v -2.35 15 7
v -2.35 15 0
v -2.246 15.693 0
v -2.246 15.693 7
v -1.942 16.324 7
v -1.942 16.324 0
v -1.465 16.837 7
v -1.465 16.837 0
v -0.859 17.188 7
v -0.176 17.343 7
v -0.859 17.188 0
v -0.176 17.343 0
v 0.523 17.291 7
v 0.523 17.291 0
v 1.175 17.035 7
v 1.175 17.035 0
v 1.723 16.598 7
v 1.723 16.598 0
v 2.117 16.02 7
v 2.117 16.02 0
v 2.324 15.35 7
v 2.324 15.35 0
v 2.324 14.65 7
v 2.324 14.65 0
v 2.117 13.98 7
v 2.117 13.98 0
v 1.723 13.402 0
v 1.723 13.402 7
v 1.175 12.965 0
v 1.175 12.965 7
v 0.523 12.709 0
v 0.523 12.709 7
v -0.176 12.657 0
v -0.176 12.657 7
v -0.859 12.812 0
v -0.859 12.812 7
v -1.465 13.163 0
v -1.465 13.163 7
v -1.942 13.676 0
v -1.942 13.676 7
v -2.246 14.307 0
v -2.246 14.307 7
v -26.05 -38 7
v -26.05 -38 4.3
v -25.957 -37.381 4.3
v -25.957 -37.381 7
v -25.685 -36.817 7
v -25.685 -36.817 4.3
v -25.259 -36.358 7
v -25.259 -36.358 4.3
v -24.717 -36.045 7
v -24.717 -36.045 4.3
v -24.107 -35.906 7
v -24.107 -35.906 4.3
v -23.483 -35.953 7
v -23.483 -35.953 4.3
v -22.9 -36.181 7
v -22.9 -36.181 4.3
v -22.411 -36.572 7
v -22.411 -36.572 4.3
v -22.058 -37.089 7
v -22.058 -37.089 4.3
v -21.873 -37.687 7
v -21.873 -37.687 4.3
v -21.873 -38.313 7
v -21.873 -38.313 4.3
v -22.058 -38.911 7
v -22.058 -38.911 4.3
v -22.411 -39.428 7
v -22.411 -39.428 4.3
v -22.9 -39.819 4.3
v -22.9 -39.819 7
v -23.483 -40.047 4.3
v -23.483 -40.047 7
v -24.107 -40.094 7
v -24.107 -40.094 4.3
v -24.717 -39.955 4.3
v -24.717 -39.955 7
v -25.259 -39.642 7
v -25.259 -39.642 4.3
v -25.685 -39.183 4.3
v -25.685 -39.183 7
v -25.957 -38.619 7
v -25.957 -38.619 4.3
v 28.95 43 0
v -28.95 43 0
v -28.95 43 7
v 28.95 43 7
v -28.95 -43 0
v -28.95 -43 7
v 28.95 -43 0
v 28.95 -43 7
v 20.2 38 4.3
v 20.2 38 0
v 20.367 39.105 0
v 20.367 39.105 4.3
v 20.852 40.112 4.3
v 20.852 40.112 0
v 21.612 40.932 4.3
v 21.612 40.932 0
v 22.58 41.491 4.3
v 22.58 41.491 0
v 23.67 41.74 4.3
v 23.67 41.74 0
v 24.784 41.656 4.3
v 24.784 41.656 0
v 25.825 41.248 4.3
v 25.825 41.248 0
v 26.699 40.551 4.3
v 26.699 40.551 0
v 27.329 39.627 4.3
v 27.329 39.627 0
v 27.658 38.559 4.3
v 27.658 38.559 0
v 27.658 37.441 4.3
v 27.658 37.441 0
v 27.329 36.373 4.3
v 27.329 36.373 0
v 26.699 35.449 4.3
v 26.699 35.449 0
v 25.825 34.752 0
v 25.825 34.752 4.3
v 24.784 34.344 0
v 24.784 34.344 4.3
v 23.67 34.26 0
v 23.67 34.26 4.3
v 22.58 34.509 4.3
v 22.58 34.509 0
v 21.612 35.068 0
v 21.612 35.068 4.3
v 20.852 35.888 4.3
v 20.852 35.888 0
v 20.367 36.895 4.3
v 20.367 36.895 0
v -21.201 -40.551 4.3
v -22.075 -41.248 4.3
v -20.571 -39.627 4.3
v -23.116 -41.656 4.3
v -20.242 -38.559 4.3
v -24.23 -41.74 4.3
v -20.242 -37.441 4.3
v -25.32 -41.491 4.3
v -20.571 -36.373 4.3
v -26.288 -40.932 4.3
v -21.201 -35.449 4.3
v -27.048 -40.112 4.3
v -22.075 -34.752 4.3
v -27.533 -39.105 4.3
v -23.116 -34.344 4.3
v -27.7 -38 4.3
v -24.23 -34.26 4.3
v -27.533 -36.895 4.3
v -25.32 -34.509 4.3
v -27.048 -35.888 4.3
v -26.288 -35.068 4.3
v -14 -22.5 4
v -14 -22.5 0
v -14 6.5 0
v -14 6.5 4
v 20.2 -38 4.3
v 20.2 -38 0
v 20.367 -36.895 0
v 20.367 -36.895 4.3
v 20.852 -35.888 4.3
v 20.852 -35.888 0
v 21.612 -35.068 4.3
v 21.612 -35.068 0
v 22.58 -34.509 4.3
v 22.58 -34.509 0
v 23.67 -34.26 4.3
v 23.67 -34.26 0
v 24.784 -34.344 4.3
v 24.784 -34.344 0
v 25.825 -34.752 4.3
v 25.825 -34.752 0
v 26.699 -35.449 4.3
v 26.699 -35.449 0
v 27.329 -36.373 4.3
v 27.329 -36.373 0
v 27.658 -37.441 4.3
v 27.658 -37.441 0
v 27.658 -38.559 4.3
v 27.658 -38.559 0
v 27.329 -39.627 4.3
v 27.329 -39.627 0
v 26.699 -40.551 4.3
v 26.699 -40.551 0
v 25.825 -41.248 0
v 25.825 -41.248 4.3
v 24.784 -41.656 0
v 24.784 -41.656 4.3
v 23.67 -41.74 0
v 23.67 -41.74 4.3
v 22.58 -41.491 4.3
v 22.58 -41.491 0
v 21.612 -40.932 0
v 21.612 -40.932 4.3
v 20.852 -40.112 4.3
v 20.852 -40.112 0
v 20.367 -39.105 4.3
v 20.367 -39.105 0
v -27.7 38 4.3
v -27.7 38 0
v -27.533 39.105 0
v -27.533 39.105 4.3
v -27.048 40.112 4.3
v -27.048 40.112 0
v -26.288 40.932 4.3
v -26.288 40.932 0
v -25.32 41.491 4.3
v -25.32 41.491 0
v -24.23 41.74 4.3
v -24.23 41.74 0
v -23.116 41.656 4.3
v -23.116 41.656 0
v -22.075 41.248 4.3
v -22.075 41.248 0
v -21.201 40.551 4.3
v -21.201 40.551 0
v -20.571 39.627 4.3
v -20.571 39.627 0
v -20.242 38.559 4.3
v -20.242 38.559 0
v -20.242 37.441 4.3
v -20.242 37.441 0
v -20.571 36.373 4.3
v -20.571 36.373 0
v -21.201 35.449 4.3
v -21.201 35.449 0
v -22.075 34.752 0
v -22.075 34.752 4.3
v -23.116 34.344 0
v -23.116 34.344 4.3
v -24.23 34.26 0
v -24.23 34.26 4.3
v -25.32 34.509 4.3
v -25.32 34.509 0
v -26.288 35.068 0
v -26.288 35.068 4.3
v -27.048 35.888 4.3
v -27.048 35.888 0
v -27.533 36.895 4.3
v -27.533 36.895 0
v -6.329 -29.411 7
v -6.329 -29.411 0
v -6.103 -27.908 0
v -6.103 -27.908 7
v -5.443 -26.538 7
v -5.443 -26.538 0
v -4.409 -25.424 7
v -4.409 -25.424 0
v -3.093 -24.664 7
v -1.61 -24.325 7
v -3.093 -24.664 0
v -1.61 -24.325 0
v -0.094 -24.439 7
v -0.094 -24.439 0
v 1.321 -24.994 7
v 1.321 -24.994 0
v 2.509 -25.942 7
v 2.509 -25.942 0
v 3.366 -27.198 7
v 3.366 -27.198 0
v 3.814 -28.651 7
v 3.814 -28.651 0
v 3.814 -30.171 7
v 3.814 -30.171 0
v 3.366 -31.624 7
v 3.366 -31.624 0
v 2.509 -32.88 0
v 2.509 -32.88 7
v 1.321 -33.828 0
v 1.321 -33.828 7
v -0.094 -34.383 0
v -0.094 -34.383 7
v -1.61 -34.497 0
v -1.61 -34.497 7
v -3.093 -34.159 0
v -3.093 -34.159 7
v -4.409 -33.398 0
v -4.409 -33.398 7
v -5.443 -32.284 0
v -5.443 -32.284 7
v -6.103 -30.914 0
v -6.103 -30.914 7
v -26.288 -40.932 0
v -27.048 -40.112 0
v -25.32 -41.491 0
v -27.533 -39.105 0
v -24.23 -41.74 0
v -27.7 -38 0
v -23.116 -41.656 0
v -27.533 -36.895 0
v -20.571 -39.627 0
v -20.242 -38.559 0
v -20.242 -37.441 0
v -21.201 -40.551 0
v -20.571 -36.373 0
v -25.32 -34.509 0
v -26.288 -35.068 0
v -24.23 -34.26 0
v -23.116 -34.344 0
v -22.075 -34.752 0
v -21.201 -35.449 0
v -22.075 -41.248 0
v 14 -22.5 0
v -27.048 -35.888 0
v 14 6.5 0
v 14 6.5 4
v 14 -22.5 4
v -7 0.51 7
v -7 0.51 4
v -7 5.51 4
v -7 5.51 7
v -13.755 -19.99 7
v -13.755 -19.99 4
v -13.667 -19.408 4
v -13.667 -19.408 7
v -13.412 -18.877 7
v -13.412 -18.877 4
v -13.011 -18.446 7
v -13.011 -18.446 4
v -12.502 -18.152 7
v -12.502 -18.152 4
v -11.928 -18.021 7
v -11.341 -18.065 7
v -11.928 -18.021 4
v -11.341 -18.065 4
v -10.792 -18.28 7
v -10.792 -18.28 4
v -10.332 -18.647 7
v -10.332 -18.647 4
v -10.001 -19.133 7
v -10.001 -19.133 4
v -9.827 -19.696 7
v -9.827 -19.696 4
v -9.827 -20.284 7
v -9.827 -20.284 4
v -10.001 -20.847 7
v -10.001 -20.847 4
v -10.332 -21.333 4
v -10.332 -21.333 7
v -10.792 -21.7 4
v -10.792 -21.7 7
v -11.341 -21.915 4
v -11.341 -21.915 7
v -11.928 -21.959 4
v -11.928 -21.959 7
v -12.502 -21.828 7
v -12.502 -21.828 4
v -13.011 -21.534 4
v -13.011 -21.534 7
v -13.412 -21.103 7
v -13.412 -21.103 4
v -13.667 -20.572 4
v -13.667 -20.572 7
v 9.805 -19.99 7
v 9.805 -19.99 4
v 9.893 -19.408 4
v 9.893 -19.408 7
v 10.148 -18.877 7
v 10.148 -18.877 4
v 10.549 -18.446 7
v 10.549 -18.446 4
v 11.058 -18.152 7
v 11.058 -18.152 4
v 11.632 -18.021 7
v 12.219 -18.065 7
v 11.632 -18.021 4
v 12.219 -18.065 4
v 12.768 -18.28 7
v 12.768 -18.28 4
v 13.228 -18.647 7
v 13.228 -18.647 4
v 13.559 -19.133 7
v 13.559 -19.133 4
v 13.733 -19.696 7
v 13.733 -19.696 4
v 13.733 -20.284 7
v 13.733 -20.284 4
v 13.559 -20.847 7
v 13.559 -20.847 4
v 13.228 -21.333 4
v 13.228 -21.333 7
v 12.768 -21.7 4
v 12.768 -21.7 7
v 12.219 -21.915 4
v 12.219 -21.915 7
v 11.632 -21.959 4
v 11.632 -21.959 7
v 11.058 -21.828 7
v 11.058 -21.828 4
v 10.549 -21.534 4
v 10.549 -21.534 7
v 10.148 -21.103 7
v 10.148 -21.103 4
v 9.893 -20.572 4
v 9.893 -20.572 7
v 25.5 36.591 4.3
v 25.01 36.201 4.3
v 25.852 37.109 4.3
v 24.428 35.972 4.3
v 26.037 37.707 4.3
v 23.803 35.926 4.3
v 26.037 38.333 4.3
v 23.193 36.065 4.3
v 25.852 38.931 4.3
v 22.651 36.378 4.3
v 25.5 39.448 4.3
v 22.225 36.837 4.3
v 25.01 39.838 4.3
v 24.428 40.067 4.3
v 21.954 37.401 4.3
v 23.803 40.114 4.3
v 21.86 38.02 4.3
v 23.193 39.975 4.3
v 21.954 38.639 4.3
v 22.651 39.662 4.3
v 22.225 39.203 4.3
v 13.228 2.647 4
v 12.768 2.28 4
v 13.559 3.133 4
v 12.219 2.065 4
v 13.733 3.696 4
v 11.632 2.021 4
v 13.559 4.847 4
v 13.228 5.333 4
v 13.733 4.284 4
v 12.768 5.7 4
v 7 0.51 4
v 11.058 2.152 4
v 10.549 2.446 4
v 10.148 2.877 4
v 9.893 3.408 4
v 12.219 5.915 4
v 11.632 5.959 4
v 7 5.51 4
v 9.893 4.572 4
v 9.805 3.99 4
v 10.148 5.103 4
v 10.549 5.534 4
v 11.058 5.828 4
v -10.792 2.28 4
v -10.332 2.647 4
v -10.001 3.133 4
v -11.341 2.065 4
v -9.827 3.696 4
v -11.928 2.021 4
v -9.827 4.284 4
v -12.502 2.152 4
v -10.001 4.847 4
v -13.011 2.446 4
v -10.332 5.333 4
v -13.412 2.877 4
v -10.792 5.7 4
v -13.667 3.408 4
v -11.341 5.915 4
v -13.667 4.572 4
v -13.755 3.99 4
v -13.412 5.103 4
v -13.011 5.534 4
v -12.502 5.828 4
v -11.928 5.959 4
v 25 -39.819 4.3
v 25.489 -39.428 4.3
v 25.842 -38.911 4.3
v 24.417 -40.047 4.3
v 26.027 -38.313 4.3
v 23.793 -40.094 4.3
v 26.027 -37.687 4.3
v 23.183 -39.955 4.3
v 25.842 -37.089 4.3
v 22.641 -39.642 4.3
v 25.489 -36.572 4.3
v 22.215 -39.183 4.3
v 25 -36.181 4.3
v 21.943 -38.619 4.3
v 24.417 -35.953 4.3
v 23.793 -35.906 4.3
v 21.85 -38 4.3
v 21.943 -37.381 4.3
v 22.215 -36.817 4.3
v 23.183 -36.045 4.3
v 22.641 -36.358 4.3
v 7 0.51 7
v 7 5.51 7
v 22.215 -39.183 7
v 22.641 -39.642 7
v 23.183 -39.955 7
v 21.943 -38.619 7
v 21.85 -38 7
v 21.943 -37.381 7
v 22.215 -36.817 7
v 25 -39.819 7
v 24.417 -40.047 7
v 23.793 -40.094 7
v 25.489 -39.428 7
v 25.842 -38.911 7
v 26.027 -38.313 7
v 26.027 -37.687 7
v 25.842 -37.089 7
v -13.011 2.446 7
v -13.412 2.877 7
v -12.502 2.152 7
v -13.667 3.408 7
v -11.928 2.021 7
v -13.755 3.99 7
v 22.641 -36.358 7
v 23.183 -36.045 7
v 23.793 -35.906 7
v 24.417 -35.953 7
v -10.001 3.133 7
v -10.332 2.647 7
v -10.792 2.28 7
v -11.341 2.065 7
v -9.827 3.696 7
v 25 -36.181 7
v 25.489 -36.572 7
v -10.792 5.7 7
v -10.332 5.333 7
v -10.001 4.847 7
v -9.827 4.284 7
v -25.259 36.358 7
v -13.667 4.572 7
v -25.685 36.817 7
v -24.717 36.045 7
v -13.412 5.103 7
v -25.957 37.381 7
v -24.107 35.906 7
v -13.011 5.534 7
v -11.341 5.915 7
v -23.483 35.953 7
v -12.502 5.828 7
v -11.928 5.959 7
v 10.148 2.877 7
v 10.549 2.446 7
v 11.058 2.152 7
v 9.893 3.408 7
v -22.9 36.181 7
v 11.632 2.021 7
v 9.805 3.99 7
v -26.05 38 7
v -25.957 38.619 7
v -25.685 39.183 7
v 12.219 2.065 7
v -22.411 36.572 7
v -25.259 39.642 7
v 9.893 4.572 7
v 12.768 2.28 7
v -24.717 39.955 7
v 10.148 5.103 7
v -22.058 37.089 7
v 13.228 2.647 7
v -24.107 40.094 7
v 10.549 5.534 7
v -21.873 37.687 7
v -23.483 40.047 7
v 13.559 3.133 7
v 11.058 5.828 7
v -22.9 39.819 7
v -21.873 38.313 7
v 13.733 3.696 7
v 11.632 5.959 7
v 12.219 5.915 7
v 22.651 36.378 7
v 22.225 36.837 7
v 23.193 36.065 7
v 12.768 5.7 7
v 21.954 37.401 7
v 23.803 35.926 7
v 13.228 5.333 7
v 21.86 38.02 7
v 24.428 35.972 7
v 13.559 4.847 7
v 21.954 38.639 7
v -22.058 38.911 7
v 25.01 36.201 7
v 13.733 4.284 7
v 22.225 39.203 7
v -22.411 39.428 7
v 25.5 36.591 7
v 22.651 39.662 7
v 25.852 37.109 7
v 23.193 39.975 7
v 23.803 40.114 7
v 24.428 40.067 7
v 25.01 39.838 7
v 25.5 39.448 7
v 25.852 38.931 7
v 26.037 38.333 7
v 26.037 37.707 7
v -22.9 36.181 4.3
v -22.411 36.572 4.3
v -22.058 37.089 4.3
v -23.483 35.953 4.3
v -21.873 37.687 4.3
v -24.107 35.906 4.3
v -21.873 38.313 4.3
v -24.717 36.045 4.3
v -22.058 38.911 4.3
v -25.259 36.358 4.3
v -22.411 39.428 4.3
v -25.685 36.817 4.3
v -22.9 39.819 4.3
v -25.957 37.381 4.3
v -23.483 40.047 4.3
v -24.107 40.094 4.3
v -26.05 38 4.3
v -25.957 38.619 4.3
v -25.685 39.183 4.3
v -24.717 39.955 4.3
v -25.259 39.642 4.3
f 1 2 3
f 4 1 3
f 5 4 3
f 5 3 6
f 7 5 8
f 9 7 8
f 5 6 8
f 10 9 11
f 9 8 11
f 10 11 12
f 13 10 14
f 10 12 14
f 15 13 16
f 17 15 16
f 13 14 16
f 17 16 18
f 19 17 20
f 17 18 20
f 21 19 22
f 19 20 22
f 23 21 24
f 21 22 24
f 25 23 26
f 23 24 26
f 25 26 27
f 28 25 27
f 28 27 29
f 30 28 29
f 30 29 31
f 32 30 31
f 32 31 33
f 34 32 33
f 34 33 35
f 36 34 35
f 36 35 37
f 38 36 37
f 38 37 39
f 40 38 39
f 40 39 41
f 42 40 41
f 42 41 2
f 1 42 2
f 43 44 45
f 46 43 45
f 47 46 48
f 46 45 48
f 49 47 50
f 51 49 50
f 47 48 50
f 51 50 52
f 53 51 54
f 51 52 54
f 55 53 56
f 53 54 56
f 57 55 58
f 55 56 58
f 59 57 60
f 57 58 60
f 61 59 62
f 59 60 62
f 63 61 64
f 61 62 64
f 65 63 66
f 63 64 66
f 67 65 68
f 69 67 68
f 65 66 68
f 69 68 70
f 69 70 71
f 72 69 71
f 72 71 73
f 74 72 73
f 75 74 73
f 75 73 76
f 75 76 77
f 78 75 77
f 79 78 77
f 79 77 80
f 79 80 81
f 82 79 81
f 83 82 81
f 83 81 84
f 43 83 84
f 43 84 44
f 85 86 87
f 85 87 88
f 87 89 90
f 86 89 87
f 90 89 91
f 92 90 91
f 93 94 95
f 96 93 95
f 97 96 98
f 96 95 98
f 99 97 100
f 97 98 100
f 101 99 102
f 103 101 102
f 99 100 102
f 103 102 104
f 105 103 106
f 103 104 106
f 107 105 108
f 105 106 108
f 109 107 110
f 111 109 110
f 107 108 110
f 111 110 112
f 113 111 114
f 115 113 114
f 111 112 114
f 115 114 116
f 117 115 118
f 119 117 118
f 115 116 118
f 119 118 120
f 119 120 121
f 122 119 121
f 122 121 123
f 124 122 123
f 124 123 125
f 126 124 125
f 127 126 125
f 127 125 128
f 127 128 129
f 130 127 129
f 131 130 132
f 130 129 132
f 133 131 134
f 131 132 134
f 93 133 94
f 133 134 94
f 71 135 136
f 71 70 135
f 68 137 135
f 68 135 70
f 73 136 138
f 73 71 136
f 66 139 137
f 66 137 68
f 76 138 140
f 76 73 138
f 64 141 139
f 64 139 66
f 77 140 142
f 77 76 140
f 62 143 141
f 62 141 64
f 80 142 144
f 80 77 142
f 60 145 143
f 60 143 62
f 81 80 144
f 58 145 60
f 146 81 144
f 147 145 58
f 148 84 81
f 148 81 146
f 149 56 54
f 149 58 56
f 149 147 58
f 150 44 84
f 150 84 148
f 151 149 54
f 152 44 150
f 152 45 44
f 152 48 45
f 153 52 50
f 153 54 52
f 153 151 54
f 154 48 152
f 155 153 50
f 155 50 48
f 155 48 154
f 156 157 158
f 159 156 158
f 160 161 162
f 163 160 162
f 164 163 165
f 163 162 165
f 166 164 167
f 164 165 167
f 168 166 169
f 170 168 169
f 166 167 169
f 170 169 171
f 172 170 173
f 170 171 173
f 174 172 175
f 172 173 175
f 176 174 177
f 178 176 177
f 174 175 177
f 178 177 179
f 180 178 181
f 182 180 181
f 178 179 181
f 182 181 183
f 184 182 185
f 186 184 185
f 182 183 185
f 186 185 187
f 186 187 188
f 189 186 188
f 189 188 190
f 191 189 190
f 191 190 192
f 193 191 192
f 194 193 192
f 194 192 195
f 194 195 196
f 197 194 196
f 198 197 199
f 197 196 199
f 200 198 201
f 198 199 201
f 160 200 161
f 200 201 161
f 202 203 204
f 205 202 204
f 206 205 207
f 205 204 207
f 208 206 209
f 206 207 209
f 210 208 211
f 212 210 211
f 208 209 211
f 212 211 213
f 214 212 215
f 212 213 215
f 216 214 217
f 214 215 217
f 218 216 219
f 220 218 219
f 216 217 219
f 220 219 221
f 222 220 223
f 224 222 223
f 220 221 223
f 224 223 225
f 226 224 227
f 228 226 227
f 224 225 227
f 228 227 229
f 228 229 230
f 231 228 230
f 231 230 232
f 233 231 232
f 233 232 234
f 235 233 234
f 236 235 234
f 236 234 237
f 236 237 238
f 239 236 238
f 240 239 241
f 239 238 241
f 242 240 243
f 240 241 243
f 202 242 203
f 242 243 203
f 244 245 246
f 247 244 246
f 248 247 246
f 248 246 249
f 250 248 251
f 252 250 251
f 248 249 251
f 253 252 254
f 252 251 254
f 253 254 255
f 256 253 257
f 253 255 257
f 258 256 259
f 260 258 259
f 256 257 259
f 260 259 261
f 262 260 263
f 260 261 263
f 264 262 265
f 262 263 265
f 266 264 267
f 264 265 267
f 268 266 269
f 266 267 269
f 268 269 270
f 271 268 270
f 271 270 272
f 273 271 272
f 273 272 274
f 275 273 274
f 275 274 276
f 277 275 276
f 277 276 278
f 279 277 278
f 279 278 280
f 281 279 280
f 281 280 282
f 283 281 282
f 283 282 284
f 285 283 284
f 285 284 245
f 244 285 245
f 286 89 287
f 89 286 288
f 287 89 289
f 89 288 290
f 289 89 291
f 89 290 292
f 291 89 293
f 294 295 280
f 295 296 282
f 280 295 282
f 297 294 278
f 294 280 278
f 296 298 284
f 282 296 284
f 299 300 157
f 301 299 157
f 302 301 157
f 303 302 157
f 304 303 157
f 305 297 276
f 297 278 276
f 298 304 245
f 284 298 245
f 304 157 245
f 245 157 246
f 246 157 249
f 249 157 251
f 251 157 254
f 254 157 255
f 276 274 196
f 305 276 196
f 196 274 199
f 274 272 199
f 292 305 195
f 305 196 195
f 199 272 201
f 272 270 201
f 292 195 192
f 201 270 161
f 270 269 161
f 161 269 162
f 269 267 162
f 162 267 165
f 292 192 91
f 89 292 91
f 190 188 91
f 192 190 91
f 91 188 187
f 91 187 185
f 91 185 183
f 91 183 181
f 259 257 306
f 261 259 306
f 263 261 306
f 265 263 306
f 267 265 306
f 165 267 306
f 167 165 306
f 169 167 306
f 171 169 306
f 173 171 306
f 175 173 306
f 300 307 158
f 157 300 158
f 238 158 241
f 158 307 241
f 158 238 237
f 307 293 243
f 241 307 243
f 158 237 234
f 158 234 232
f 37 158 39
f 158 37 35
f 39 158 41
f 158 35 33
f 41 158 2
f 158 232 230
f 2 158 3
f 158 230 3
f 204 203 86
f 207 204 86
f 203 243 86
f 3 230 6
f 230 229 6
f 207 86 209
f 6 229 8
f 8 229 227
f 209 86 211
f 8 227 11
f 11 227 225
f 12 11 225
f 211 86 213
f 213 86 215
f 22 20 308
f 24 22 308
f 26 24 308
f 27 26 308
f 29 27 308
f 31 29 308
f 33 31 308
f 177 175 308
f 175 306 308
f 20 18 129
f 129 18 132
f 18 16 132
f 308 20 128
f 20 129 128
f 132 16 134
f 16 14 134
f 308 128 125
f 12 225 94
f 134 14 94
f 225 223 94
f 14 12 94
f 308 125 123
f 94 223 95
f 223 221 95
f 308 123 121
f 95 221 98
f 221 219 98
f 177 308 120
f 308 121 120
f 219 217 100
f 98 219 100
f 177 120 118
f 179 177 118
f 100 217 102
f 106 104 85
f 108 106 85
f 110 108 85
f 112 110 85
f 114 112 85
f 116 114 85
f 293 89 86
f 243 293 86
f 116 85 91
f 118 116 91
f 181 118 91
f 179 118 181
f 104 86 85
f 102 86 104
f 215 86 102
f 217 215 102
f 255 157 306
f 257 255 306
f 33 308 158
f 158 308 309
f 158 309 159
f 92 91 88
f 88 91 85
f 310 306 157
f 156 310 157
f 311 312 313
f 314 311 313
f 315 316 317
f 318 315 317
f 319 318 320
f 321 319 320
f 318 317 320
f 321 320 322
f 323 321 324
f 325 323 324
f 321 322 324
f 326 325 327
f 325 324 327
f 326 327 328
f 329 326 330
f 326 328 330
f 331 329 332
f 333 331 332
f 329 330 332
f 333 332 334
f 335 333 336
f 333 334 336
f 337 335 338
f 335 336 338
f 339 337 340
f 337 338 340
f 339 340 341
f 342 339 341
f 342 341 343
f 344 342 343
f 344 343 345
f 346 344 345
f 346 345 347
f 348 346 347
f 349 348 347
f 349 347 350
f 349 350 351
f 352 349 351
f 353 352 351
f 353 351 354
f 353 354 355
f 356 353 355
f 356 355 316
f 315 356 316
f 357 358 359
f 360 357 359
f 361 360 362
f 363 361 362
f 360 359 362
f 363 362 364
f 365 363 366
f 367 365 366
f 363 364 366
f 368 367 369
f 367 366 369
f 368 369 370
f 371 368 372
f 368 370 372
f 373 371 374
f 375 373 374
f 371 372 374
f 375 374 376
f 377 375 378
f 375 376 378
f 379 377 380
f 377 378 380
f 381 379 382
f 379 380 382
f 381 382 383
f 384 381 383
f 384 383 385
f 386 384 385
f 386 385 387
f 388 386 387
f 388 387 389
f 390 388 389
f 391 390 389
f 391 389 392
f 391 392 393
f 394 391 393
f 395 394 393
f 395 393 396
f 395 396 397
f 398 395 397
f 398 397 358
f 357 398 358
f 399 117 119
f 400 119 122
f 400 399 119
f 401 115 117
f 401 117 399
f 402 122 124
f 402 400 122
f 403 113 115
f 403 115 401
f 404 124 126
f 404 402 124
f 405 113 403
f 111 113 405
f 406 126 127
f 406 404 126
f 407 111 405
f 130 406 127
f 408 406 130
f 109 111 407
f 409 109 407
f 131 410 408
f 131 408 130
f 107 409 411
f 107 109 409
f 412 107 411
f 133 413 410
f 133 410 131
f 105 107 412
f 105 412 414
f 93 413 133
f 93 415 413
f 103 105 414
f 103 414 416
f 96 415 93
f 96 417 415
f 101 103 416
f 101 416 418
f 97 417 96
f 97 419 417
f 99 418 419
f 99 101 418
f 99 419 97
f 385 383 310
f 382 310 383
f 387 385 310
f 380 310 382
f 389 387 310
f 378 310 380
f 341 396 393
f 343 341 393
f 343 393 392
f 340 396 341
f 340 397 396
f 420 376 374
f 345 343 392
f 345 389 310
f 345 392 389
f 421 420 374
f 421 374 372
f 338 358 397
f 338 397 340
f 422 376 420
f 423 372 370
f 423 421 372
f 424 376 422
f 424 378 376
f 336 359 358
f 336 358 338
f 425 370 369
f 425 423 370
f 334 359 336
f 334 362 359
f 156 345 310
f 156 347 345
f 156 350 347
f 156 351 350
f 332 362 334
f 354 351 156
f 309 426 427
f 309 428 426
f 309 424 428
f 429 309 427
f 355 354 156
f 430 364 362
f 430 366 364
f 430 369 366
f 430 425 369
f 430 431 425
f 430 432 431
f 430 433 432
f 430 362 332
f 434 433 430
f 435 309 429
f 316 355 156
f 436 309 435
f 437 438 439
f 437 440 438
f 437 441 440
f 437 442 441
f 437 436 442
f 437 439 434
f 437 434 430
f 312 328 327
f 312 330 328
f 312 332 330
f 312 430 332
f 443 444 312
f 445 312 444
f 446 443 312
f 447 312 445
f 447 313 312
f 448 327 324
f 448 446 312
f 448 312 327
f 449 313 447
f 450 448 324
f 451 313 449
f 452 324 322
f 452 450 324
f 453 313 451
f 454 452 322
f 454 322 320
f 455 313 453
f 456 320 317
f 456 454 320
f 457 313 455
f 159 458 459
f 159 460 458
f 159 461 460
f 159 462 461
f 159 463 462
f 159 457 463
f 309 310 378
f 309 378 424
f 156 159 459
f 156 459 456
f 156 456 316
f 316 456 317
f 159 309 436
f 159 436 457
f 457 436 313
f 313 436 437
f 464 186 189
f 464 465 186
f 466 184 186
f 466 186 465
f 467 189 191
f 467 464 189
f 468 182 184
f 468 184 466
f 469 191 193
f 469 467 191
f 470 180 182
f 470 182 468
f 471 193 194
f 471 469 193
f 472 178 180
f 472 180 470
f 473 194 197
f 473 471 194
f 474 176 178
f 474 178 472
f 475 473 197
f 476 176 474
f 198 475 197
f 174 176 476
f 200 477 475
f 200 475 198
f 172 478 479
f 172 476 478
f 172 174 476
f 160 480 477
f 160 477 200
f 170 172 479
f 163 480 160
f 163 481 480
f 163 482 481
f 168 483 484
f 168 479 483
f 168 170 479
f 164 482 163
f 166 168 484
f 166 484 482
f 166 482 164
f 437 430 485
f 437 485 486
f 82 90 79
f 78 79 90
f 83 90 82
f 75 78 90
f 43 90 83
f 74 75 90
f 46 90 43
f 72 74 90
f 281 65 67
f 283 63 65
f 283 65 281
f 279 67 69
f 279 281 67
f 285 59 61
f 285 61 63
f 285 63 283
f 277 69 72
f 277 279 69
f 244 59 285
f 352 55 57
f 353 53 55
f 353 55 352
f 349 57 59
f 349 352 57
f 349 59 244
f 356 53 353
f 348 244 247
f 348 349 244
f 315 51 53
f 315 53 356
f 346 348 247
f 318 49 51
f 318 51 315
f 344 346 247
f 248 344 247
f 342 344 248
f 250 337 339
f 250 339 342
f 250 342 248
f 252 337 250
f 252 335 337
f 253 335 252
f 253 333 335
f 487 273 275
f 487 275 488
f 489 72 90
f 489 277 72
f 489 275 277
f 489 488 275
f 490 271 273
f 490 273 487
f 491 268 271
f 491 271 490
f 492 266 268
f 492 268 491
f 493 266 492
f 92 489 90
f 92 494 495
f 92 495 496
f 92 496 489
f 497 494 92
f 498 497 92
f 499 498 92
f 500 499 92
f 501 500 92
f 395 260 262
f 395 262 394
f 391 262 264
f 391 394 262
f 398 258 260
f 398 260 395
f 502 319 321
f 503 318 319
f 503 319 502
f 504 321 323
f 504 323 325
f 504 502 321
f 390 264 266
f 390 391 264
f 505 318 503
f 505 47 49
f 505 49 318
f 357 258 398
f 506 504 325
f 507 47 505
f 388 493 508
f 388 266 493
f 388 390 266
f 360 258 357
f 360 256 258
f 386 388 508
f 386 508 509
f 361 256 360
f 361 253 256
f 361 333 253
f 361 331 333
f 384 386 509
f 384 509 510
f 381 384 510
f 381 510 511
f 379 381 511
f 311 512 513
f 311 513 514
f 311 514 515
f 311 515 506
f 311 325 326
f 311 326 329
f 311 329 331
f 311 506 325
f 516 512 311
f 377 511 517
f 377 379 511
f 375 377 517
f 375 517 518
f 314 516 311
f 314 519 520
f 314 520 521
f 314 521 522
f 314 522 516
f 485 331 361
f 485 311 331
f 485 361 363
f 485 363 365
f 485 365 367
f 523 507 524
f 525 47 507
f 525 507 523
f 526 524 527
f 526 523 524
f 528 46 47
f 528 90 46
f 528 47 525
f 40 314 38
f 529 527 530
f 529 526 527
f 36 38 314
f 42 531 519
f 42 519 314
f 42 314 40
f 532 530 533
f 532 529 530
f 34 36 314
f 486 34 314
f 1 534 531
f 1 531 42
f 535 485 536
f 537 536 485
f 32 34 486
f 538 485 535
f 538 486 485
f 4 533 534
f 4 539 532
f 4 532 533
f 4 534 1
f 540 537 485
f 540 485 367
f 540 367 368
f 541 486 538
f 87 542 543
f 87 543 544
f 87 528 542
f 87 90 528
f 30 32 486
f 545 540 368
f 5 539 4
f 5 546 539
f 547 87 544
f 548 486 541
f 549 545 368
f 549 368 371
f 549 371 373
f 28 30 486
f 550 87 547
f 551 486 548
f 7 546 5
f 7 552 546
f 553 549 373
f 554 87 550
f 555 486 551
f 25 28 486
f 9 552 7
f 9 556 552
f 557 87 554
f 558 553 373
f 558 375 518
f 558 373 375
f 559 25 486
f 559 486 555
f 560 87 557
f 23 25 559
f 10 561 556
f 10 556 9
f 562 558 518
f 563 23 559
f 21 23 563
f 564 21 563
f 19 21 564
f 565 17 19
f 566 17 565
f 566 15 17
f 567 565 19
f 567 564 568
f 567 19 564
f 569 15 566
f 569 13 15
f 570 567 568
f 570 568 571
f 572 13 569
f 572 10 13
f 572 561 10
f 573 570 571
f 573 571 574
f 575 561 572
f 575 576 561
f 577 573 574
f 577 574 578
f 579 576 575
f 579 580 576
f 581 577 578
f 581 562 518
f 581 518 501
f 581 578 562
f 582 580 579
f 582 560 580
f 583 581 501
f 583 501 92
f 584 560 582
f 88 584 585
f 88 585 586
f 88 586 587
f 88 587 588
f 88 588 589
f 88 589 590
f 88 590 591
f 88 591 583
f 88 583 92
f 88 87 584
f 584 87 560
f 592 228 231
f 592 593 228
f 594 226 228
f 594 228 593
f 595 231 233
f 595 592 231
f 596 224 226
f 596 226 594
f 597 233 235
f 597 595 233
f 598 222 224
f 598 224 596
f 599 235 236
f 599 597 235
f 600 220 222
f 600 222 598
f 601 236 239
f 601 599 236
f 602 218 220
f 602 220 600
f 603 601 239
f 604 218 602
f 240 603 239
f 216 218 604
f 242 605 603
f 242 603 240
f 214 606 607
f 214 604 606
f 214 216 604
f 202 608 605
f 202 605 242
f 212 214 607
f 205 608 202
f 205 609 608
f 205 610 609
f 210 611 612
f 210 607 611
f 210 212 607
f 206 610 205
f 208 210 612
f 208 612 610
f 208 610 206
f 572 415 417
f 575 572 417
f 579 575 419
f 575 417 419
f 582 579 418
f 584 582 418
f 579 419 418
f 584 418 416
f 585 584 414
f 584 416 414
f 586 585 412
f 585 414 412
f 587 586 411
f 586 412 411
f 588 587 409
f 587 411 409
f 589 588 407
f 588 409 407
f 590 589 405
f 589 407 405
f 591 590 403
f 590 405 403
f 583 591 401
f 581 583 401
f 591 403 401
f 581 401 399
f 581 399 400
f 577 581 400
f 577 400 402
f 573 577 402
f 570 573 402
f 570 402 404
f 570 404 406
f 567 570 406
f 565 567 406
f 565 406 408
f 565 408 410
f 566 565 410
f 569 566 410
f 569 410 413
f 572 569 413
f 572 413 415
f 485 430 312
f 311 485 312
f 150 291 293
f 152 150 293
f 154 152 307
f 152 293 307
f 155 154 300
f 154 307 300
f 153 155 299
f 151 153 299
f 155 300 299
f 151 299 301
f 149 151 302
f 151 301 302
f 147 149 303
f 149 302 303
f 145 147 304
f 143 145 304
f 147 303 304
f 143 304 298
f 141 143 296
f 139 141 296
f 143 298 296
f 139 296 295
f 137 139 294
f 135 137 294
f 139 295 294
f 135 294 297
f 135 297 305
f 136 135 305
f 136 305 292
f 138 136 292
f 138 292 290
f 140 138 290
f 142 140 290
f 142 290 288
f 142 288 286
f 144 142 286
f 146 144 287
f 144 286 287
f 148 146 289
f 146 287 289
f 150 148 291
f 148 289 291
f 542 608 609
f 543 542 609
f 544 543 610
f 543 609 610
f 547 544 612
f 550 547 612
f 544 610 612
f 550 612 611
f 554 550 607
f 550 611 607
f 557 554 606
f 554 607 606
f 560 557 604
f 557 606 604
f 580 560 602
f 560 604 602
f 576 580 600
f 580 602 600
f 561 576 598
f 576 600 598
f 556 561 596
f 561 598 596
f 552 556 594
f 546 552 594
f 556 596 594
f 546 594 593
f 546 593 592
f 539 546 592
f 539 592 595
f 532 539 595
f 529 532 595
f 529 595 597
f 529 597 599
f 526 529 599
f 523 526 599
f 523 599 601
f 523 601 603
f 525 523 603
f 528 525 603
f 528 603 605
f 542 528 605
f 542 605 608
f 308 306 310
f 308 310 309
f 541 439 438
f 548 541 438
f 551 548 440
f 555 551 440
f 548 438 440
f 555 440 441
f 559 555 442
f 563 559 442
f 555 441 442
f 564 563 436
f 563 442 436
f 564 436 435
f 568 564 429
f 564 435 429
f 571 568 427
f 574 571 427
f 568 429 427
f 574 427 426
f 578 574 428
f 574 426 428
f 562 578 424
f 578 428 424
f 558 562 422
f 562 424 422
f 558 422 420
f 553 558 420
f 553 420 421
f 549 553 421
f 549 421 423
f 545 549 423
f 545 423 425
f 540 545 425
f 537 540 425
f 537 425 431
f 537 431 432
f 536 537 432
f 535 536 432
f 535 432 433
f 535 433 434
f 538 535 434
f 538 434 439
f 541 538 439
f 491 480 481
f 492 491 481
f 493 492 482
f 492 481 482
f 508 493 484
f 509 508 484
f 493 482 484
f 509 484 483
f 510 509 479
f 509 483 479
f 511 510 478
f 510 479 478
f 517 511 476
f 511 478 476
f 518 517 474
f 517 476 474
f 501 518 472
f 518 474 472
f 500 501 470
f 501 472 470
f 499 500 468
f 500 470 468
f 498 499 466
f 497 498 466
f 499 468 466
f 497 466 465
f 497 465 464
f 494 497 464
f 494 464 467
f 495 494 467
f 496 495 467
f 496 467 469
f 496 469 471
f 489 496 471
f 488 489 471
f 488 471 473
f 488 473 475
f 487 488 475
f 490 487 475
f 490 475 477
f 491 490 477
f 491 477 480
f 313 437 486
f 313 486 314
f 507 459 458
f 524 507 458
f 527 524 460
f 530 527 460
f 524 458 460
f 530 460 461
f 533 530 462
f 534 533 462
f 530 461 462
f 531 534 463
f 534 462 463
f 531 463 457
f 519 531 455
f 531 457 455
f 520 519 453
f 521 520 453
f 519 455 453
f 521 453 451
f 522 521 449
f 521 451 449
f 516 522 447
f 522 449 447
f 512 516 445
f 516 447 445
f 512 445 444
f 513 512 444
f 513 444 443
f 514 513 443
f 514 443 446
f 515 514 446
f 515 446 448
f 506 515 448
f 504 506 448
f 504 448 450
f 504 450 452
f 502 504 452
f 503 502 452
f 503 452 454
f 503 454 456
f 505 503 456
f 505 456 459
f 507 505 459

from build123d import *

# Parameters (mm, degrees)
ESQUISSE1_W             = 57.9
ESQUISSE1_H             = 86
BOSS_EXTRU_1_DEPTH      = 7
ESQUISSE3_R             = 2.1
ESQUISSE3_R_2           = 5.1
ENL_V_MAT_EXTRU_2_DEPTH = 53.30776711
ESQUISSE4_R             = 3.75
ENL_V_MAT_EXTRU_3_DEPTH = 4.3
ESQUISSE6_R             = 3.75
ENL_V_MAT_EXTRU_5_DEPTH = 4.3
ESQUISSE7_W             = 28
ESQUISSE7_H             = 29
ENL_V_MAT_EXTRU_6_DEPTH = 4
ESQUISSE9_R             = 1.975
ESQUISSE9_W             = 14
ESQUISSE9_H             = 5
ENL_V_MAT_EXTRU_7_DEPTH = 52.991369476
ESQUISSE10_R            = 2.35
ENL_V_MAT_EXTRU_8_DEPTH = 53.30776711


with BuildPart() as part:
    # Esquisse1 → Boss.-Extru.1 (new body)
    with BuildSketch(Plane.XY):
        Rectangle(ESQUISSE1_W, ESQUISSE1_H)
    extrude(amount=BOSS_EXTRU_1_DEPTH)

    # Esquisse3 → Enlèv. mat.-Extru.2 (cut, through all)
    with BuildSketch(Plane(origin=(0, 0, 0), x_dir=(-1, 0, 0), z_dir=(0, 0, -1))):
        with Locations((23.95, 38)):
            Circle(ESQUISSE3_R)
        with Locations((-23.960388264, 38.019803714)):
            Circle(ESQUISSE3_R)
        with Locations((23.95, -38)):
            Circle(ESQUISSE3_R)
        with Locations((-23.95, -38)):
            Circle(ESQUISSE3_R)
        with Locations((1.229278893, -29.411147051)):
            Circle(ESQUISSE3_R_2)
    extrude(amount=-ENL_V_MAT_EXTRU_2_DEPTH, mode=Mode.SUBTRACT)

    # Esquisse4 → Enlèv. mat.-Extru.3 (cut)
    with BuildSketch(Plane(origin=(0, 0, 0), x_dir=(-1, 0, 0), z_dir=(0, 0, -1))):
        with Locations((23.95, -38)):
            Circle(ESQUISSE4_R)
        with Locations((-23.95, -38)):
            Circle(ESQUISSE4_R)
        with Locations((23.95, 38)):
            Circle(ESQUISSE4_R)
    extrude(amount=-ENL_V_MAT_EXTRU_3_DEPTH, mode=Mode.SUBTRACT)

    # Esquisse6 → Enlèv. mat.-Extru.5 (cut)
    with BuildSketch(Plane(origin=(0, 0, 0), x_dir=(-1, 0, 0), z_dir=(0, 0, -1))):
        with Locations((-23.95, 38)):
            Circle(ESQUISSE6_R)
    extrude(amount=-ENL_V_MAT_EXTRU_5_DEPTH, mode=Mode.SUBTRACT)

    # Esquisse7 → Enlèv. mat.-Extru.6 (cut)
    with BuildSketch(Plane(origin=(0, 0, 0), x_dir=(-1, 0, 0), z_dir=(0, 0, -1))):
        with Locations((0, -8)):
            Rectangle(ESQUISSE7_W, ESQUISSE7_H)
    extrude(amount=-ENL_V_MAT_EXTRU_6_DEPTH, mode=Mode.SUBTRACT)

    # Esquisse9 → Enlèv. mat.-Extru.7 (cut, through all)
    with BuildSketch(Plane(origin=(0, 0, 4), x_dir=(-1, 0, 0), z_dir=(0, 0, -1))):
        with Locations((11.78, -19.99)):
            Circle(ESQUISSE9_R)
        with Locations((-11.78, -19.99)):
            Circle(ESQUISSE9_R)
        with Locations((-11.78, 3.99)):
            Circle(ESQUISSE9_R)
        with Locations((11.78, 3.99)):
            Circle(ESQUISSE9_R)
        with Locations((0, 3.01)):
            Rectangle(ESQUISSE9_W, ESQUISSE9_H)
    extrude(amount=-ENL_V_MAT_EXTRU_7_DEPTH, mode=Mode.SUBTRACT)

    # Esquisse10 → Enlèv. mat.-Extru.8 (cut, through all)
    with BuildSketch(Plane(origin=(0, 0, 0), x_dir=(-1, 0, 0), z_dir=(0, 0, -1))):
        with Locations((0, 15)):
            Circle(ESQUISSE10_R)
    extrude(amount=-ENL_V_MAT_EXTRU_8_DEPTH, mode=Mode.SUBTRACT)


solid = part.part
